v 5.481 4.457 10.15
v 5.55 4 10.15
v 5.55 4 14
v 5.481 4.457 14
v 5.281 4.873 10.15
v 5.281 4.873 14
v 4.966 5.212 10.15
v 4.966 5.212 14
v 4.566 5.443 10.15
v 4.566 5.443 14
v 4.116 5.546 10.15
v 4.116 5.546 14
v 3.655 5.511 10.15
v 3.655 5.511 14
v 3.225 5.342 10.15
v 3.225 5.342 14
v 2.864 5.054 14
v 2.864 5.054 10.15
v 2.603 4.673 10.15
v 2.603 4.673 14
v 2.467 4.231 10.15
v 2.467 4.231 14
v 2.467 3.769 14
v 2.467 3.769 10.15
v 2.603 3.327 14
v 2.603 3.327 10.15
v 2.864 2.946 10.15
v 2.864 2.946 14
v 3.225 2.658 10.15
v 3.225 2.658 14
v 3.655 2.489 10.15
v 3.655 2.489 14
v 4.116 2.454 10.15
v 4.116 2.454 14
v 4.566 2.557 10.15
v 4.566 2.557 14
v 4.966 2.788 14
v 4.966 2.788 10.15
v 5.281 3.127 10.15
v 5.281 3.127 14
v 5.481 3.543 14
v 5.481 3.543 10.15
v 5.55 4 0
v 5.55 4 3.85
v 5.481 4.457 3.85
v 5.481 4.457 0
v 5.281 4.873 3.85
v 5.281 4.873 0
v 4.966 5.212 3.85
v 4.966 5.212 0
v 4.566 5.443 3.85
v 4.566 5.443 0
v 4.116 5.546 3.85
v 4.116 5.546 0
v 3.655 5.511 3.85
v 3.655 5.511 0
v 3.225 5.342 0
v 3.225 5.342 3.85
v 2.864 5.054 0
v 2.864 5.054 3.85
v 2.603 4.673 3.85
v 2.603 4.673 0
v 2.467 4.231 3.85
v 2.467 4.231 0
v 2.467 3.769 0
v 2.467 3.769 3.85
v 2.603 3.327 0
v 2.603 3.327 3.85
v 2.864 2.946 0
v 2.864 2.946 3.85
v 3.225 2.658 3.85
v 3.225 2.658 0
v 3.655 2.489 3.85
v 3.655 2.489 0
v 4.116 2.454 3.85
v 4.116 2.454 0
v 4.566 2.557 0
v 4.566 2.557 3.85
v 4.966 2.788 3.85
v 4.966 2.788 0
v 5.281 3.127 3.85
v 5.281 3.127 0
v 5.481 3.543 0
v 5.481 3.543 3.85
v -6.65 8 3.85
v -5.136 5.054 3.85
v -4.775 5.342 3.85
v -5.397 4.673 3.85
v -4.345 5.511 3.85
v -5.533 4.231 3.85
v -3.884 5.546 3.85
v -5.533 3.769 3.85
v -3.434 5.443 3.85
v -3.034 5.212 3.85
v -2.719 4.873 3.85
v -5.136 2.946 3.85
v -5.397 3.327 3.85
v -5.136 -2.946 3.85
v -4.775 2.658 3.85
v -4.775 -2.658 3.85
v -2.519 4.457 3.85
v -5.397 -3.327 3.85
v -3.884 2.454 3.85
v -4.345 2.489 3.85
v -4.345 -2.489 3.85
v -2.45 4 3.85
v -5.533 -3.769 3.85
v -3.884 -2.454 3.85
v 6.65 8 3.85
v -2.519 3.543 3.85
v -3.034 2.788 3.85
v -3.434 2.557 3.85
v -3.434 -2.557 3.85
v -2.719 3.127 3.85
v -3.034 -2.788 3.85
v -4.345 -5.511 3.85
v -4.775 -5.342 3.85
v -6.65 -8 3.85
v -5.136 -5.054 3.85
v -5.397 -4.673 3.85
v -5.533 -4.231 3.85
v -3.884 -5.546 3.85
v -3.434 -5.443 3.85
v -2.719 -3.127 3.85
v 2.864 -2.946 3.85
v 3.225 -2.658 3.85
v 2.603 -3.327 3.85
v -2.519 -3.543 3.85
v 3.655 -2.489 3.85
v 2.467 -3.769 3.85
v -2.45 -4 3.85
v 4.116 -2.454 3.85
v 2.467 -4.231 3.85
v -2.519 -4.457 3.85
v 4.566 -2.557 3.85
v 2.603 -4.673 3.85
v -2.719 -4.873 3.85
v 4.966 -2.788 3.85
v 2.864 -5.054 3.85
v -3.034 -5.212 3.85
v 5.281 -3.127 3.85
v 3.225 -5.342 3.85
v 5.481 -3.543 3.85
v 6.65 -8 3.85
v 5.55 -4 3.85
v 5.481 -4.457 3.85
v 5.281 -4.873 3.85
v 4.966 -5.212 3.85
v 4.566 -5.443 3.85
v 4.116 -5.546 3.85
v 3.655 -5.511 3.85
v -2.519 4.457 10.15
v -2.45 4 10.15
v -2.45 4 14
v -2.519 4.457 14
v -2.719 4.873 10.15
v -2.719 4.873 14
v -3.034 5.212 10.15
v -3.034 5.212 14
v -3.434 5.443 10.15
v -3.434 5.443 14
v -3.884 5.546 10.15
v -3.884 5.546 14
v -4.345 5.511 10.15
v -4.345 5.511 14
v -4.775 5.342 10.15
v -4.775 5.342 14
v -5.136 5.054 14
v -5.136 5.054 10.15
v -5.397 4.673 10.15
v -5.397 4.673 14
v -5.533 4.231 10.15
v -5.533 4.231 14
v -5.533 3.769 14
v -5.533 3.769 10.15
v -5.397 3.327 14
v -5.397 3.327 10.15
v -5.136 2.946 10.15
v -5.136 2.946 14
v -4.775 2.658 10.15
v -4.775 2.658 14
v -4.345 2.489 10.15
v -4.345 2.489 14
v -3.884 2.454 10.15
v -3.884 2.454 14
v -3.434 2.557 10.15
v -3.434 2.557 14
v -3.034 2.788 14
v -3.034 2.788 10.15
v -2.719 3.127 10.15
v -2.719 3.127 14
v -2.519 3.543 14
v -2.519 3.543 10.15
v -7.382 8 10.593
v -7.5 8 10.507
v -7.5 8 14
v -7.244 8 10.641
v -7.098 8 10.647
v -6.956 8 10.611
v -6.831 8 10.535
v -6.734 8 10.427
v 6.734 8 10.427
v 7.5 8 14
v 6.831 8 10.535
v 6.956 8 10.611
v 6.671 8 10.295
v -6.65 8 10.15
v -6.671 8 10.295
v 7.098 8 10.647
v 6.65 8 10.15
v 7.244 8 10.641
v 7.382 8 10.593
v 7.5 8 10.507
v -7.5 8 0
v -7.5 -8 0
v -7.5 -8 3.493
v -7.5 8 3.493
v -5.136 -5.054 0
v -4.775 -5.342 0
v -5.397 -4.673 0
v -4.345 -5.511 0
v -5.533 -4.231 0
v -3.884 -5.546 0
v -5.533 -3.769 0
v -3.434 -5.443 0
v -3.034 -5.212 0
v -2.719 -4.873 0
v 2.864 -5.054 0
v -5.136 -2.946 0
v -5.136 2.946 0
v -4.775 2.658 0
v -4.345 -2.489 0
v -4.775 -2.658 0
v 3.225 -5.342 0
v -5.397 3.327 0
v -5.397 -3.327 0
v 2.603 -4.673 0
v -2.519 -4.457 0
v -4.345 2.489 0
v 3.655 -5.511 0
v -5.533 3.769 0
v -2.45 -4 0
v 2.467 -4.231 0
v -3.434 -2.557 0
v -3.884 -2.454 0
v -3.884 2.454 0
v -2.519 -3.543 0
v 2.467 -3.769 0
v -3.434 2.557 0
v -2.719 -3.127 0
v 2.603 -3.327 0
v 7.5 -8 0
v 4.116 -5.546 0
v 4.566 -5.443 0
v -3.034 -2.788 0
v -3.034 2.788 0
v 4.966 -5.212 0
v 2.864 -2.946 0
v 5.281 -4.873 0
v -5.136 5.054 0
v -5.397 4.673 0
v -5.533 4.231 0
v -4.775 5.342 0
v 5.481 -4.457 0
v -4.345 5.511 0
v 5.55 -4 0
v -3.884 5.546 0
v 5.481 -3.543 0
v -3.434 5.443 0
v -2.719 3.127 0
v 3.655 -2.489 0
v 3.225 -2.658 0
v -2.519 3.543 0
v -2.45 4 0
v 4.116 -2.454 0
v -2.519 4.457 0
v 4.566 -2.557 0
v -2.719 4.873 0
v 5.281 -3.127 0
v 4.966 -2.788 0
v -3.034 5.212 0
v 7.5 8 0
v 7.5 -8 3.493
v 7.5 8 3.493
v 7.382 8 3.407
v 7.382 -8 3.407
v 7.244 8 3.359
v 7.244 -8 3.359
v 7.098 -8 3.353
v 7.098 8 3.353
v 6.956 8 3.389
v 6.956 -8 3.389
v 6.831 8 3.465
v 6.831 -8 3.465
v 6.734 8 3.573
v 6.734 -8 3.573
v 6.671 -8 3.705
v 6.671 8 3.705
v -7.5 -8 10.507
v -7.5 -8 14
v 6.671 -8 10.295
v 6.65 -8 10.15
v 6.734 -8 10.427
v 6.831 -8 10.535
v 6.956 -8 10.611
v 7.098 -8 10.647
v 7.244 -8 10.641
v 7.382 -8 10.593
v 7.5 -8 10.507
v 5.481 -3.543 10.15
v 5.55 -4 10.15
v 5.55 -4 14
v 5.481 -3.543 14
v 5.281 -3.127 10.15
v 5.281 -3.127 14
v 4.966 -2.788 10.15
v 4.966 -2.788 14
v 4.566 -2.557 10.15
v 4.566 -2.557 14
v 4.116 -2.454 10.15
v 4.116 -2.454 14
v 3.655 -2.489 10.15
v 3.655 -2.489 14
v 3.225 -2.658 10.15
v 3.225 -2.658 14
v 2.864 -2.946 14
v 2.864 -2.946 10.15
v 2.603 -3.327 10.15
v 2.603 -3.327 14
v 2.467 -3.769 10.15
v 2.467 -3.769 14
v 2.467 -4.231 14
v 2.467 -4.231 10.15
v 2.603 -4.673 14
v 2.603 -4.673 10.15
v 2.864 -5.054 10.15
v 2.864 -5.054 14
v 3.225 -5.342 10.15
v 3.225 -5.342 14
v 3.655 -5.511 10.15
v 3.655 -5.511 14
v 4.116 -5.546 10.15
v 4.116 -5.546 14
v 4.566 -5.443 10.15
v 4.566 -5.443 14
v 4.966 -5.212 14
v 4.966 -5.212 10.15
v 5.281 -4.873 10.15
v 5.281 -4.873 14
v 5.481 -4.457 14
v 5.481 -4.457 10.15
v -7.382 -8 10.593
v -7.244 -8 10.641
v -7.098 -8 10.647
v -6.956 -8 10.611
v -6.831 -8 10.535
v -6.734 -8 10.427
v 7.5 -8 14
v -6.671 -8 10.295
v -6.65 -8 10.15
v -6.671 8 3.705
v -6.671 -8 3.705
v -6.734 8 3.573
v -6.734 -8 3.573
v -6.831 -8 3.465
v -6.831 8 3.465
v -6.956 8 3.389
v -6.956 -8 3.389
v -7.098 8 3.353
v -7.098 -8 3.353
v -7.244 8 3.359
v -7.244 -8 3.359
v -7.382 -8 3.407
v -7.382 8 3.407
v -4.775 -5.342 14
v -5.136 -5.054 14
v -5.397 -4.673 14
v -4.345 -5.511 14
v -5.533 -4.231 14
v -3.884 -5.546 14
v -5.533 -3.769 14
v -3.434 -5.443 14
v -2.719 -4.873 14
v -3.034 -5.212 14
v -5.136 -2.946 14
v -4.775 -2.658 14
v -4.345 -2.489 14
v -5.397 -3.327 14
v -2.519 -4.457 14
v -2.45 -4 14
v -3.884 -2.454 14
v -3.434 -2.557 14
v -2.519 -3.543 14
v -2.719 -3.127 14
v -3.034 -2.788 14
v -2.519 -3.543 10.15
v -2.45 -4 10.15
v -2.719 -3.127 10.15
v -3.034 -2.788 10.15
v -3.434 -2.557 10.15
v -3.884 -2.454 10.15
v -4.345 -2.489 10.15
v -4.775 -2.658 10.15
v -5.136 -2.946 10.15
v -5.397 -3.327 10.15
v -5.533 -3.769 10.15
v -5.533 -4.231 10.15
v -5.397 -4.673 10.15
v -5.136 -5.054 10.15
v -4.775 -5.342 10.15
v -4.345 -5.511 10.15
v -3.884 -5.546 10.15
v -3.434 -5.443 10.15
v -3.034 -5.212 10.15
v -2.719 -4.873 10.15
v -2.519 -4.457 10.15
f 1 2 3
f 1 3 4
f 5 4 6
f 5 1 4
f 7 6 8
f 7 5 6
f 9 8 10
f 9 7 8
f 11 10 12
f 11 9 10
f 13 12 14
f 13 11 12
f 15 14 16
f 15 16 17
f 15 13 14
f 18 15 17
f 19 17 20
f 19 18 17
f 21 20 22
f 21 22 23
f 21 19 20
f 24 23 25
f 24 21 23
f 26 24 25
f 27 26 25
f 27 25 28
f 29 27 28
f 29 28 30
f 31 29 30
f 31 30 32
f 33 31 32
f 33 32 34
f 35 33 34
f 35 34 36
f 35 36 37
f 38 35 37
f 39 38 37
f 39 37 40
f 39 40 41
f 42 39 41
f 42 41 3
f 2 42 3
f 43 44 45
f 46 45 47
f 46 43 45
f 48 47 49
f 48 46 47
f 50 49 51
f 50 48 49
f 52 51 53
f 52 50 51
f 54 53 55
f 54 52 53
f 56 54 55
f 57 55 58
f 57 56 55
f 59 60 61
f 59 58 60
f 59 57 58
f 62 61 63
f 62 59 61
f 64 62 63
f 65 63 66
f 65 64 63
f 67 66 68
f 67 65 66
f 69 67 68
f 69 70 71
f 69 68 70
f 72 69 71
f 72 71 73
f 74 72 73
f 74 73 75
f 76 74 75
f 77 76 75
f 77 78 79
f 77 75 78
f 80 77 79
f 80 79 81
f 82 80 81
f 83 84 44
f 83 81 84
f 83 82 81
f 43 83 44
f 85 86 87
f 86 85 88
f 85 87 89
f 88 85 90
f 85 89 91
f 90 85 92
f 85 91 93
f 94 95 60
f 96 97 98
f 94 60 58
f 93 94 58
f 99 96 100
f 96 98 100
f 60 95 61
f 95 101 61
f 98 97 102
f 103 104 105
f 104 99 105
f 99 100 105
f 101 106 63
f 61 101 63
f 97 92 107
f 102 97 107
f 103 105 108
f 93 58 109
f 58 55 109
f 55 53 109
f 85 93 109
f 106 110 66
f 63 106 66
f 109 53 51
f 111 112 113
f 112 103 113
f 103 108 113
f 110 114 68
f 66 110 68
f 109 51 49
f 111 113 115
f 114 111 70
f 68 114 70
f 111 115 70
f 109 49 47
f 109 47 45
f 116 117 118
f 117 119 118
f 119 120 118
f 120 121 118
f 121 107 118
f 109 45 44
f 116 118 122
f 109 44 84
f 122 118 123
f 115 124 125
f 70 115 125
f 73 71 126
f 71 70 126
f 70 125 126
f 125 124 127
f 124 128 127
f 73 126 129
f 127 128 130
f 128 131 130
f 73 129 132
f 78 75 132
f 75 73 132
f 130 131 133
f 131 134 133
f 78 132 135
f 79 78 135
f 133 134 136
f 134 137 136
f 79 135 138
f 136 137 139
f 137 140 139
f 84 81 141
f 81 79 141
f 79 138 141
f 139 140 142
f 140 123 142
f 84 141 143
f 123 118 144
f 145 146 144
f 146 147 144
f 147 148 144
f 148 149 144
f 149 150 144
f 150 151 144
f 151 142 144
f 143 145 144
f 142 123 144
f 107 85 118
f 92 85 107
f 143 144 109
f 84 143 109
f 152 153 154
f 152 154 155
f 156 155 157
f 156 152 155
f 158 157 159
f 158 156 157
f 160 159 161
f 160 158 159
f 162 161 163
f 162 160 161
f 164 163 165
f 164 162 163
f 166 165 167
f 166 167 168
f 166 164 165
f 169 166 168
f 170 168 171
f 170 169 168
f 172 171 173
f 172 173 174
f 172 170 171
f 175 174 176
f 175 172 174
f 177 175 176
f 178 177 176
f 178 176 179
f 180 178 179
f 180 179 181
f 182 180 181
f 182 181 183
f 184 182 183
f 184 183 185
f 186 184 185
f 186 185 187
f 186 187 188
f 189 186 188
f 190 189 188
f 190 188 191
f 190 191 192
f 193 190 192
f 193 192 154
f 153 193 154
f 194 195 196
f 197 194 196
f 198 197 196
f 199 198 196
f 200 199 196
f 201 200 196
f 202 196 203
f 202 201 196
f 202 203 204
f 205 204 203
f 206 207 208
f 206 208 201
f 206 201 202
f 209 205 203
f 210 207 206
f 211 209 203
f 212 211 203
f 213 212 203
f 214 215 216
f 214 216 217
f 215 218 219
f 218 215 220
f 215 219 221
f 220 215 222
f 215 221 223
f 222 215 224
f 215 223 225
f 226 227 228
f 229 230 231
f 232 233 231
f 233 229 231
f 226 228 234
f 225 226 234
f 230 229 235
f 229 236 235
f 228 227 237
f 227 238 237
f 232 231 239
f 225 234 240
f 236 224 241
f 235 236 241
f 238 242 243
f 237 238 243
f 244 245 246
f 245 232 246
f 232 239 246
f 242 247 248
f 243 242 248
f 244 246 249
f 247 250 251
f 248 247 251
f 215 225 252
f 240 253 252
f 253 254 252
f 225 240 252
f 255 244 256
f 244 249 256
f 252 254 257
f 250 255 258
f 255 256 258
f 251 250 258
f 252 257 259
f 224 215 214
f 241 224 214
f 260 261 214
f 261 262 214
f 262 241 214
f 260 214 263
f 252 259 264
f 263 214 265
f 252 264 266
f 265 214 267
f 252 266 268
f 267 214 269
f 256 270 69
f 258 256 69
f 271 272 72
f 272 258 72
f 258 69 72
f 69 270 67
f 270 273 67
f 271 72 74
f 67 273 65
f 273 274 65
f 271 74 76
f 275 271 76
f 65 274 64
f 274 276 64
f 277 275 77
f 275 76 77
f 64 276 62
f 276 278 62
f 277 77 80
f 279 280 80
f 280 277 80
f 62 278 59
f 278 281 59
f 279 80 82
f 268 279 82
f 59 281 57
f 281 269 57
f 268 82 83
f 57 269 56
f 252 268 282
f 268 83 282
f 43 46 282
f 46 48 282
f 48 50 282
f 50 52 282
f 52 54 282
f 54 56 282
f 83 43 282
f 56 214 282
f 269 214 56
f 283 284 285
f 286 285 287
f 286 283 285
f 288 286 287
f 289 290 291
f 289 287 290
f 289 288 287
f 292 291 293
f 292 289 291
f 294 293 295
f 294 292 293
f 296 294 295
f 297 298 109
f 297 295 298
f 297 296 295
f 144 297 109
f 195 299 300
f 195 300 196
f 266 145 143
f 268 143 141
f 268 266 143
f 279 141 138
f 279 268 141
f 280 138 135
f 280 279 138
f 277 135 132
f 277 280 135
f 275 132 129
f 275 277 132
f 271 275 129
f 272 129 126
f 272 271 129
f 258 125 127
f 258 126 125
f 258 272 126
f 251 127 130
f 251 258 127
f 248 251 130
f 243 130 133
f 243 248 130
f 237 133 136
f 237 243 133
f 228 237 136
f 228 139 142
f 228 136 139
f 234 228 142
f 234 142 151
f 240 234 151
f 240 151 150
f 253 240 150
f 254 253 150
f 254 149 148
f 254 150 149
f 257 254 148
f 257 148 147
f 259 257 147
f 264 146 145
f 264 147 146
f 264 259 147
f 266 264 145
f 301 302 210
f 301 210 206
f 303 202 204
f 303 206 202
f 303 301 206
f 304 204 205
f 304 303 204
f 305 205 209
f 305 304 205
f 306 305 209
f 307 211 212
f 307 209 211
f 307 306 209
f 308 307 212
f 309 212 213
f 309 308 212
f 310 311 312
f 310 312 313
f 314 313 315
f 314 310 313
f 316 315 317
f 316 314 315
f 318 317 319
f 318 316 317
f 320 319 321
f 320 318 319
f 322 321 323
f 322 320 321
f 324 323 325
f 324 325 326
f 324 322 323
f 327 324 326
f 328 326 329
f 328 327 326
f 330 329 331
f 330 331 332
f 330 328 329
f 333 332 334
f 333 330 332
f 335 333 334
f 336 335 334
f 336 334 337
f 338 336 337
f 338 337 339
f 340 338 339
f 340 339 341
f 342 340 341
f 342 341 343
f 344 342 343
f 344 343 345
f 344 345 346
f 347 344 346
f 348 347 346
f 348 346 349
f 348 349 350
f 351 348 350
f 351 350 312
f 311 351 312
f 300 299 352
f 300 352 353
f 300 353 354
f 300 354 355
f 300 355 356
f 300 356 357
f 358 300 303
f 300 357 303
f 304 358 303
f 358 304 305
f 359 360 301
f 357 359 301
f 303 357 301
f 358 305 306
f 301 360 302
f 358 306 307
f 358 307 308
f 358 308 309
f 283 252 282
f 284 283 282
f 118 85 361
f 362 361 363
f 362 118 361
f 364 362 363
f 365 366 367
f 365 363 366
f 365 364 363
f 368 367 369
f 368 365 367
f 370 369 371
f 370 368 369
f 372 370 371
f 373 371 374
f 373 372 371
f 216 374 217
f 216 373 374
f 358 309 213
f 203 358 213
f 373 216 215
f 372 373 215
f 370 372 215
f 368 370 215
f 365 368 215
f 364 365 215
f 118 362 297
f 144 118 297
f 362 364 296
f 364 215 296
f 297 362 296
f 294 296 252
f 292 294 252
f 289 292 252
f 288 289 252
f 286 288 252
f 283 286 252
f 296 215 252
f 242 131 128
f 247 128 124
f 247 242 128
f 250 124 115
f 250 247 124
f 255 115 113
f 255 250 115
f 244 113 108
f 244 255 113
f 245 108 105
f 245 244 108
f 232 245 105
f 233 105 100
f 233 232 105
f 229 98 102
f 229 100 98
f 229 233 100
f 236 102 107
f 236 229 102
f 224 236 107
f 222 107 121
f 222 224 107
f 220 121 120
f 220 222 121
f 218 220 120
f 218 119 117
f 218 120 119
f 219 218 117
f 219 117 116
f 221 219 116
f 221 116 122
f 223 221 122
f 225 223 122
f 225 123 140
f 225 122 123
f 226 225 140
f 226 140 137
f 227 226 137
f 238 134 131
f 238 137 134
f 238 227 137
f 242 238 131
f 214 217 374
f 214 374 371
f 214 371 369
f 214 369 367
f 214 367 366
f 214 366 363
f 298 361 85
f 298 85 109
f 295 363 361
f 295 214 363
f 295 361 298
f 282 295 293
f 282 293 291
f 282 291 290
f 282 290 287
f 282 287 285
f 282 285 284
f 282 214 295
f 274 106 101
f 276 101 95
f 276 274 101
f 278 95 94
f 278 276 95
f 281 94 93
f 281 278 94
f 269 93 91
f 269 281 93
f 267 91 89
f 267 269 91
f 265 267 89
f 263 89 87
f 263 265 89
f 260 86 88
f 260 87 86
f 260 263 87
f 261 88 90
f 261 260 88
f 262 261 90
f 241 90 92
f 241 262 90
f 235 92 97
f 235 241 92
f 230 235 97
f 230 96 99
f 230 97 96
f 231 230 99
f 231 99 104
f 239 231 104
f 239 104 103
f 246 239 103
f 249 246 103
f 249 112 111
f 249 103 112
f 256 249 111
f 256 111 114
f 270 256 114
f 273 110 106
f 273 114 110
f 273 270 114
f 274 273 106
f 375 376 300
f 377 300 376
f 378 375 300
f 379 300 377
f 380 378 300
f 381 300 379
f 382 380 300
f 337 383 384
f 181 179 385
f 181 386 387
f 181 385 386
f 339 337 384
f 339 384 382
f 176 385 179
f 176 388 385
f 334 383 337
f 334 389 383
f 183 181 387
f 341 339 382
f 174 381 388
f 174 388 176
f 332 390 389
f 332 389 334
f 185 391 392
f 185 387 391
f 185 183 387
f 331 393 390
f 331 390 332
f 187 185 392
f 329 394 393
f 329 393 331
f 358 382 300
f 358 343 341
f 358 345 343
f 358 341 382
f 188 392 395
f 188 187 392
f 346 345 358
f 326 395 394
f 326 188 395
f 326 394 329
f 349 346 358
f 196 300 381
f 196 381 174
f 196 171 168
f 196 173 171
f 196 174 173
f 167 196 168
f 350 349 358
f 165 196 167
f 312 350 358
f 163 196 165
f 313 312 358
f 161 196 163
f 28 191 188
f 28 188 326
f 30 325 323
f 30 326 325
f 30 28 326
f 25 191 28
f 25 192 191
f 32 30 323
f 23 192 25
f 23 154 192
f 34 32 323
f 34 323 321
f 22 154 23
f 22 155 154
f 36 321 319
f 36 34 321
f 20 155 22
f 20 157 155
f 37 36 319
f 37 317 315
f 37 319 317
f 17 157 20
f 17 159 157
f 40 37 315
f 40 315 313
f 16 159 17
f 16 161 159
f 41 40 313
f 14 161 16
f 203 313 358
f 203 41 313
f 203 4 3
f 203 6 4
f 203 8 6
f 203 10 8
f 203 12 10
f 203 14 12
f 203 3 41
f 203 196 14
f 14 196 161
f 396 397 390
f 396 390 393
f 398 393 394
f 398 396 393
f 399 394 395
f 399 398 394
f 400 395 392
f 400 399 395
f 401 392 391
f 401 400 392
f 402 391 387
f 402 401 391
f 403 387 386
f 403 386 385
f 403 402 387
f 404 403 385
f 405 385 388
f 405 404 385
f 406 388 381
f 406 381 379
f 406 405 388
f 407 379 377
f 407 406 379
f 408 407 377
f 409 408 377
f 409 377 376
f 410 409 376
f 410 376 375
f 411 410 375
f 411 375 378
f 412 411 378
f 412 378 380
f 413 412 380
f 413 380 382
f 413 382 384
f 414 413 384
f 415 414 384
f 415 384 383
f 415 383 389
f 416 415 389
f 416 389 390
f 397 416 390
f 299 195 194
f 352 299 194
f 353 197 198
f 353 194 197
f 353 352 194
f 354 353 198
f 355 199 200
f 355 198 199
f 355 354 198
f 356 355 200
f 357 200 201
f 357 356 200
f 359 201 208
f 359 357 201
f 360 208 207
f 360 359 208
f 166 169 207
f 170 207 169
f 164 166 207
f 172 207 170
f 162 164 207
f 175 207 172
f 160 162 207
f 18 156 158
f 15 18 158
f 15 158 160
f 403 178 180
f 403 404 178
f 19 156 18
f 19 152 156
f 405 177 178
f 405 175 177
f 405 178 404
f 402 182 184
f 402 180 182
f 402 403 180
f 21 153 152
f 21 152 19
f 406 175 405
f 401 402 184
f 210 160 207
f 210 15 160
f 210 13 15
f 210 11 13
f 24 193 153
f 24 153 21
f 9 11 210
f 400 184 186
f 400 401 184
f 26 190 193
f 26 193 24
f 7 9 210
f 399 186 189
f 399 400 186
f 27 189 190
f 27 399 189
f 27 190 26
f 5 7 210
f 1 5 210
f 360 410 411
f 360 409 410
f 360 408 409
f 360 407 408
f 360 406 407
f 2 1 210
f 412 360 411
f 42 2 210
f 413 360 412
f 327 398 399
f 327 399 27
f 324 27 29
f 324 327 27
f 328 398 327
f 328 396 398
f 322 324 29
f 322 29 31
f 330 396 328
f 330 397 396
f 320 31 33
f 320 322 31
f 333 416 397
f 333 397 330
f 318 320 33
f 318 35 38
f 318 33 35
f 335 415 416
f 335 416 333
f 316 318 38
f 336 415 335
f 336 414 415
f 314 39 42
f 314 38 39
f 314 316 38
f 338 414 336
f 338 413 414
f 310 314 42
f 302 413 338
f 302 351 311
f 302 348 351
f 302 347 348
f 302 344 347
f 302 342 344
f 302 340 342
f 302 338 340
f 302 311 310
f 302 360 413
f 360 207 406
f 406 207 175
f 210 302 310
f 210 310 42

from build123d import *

# Parameters (mm, degrees)
SKETCH_1_W               = 15
SKETCH_1_H               = 16
SKETCH_1_R               = 1.55
EXTRUDE_1_DEPTH          = 14
CUT_EXTRUDE_1_DEPTH      = 23.544400635
CUT_EXTRUDE_1_DEPTH_BACK = 23.544400635
SKETCH_2_R               = 0.5
SKETCH_2_W               = 15.3
SKETCH_2_H               = 6.3


with BuildPart() as part:
    # 草图1 → 凸台-拉伸1 (new body)
    with BuildSketch(Plane.XY):
        Rectangle(SKETCH_1_W, SKETCH_1_H)
        with Locations((-4, 4)):
            Circle(SKETCH_1_R, mode=Mode.SUBTRACT)
        with Locations((4, 4)):
            Circle(SKETCH_1_R, mode=Mode.SUBTRACT)
        with Locations((-4, -4)):
            Circle(SKETCH_1_R, mode=Mode.SUBTRACT)
        with Locations((4, -4)):
            Circle(SKETCH_1_R, mode=Mode.SUBTRACT)
    extrude(amount=EXTRUDE_1_DEPTH)

    # 草图2 → 切除-拉伸1 (cut, two sides: drawn at the far end of the back side and taken through both)
    with BuildSketch(Plane(origin=(0, 8, 0), x_dir=(1, 0, 0), z_dir=(0, 1, 0)).offset(-CUT_EXTRUDE_1_DEPTH_BACK)):
        with Locations((-7.15, -10.15)):
            Circle(SKETCH_2_R)
        with Locations((7.15, -10.15)):
            Circle(SKETCH_2_R)
        with Locations((7.15, -3.85)):
            Circle(SKETCH_2_R)
        with Locations((-7.15, -3.85)):
            Circle(SKETCH_2_R)
        with Locations((0, -7)):
            Rectangle(SKETCH_2_W, SKETCH_2_H)
        with BuildLine():
            ThreePointArc((-6.65, -3.85), (-7.15, -3.35), (-7.65, -3.85))
            Line((-7.65, -3.85), (-6.65, -3.85))
        make_face()
        with BuildLine():
            Line((-6.65, -3.85), (-7.65, -3.85))
            ThreePointArc((-7.65, -3.85), (-7.15, -4.35), (-6.65, -3.85))
        make_face()
        with BuildLine():
            ThreePointArc((-7.65, -10.15), (-7.15, -10.65), (-6.65, -10.15))
            Line((-6.65, -10.15), (-7.65, -10.15))
        make_face()
        with BuildLine():
            Line((-7.65, -10.15), (-6.65, -10.15))
            ThreePointArc((-6.65, -10.15), (-7.15, -9.65), (-7.65, -10.15))
        make_face()
        with BuildLine():
            ThreePointArc((6.65, -3.85), (7.15, -4.35), (7.65, -3.85))
            Line((7.65, -3.85), (6.65, -3.85))
        make_face()
        with BuildLine():
            Line((6.65, -3.85), (7.65, -3.85))
            ThreePointArc((7.65, -3.85), (7.15, -3.35), (6.65, -3.85))
        make_face()
        with BuildLine():
            ThreePointArc((7.65, -10.15), (7.15, -9.65), (6.65, -10.15))
            Line((6.65, -10.15), (7.65, -10.15))
        make_face()
        with BuildLine():
            Line((7.65, -10.15), (6.65, -10.15))
            ThreePointArc((6.65, -10.15), (7.15, -10.65), (7.65, -10.15))
        make_face()
    extrude(amount=CUT_EXTRUDE_1_DEPTH + CUT_EXTRUDE_1_DEPTH_BACK, mode=Mode.SUBTRACT)


with BuildPart() as cut_extrude_1_piece_1:
    # of the separate pieces the step leaves, piece 1, a body of its own (cut_extrude_1_pieces)
    add(part.part.solids().sort_by_distance((7.5, -8, 0))[0])


with BuildPart() as cut_extrude_1_piece_2:
    # of the separate pieces the step leaves, piece 2, a body of its own (cut_extrude_1_pieces)
    add(part.part.solids().sort_by_distance((7.5, -8, 10.507071421))[0])


solid = Compound([cut_extrude_1_piece_1.part, cut_extrude_1_piece_2.part])
